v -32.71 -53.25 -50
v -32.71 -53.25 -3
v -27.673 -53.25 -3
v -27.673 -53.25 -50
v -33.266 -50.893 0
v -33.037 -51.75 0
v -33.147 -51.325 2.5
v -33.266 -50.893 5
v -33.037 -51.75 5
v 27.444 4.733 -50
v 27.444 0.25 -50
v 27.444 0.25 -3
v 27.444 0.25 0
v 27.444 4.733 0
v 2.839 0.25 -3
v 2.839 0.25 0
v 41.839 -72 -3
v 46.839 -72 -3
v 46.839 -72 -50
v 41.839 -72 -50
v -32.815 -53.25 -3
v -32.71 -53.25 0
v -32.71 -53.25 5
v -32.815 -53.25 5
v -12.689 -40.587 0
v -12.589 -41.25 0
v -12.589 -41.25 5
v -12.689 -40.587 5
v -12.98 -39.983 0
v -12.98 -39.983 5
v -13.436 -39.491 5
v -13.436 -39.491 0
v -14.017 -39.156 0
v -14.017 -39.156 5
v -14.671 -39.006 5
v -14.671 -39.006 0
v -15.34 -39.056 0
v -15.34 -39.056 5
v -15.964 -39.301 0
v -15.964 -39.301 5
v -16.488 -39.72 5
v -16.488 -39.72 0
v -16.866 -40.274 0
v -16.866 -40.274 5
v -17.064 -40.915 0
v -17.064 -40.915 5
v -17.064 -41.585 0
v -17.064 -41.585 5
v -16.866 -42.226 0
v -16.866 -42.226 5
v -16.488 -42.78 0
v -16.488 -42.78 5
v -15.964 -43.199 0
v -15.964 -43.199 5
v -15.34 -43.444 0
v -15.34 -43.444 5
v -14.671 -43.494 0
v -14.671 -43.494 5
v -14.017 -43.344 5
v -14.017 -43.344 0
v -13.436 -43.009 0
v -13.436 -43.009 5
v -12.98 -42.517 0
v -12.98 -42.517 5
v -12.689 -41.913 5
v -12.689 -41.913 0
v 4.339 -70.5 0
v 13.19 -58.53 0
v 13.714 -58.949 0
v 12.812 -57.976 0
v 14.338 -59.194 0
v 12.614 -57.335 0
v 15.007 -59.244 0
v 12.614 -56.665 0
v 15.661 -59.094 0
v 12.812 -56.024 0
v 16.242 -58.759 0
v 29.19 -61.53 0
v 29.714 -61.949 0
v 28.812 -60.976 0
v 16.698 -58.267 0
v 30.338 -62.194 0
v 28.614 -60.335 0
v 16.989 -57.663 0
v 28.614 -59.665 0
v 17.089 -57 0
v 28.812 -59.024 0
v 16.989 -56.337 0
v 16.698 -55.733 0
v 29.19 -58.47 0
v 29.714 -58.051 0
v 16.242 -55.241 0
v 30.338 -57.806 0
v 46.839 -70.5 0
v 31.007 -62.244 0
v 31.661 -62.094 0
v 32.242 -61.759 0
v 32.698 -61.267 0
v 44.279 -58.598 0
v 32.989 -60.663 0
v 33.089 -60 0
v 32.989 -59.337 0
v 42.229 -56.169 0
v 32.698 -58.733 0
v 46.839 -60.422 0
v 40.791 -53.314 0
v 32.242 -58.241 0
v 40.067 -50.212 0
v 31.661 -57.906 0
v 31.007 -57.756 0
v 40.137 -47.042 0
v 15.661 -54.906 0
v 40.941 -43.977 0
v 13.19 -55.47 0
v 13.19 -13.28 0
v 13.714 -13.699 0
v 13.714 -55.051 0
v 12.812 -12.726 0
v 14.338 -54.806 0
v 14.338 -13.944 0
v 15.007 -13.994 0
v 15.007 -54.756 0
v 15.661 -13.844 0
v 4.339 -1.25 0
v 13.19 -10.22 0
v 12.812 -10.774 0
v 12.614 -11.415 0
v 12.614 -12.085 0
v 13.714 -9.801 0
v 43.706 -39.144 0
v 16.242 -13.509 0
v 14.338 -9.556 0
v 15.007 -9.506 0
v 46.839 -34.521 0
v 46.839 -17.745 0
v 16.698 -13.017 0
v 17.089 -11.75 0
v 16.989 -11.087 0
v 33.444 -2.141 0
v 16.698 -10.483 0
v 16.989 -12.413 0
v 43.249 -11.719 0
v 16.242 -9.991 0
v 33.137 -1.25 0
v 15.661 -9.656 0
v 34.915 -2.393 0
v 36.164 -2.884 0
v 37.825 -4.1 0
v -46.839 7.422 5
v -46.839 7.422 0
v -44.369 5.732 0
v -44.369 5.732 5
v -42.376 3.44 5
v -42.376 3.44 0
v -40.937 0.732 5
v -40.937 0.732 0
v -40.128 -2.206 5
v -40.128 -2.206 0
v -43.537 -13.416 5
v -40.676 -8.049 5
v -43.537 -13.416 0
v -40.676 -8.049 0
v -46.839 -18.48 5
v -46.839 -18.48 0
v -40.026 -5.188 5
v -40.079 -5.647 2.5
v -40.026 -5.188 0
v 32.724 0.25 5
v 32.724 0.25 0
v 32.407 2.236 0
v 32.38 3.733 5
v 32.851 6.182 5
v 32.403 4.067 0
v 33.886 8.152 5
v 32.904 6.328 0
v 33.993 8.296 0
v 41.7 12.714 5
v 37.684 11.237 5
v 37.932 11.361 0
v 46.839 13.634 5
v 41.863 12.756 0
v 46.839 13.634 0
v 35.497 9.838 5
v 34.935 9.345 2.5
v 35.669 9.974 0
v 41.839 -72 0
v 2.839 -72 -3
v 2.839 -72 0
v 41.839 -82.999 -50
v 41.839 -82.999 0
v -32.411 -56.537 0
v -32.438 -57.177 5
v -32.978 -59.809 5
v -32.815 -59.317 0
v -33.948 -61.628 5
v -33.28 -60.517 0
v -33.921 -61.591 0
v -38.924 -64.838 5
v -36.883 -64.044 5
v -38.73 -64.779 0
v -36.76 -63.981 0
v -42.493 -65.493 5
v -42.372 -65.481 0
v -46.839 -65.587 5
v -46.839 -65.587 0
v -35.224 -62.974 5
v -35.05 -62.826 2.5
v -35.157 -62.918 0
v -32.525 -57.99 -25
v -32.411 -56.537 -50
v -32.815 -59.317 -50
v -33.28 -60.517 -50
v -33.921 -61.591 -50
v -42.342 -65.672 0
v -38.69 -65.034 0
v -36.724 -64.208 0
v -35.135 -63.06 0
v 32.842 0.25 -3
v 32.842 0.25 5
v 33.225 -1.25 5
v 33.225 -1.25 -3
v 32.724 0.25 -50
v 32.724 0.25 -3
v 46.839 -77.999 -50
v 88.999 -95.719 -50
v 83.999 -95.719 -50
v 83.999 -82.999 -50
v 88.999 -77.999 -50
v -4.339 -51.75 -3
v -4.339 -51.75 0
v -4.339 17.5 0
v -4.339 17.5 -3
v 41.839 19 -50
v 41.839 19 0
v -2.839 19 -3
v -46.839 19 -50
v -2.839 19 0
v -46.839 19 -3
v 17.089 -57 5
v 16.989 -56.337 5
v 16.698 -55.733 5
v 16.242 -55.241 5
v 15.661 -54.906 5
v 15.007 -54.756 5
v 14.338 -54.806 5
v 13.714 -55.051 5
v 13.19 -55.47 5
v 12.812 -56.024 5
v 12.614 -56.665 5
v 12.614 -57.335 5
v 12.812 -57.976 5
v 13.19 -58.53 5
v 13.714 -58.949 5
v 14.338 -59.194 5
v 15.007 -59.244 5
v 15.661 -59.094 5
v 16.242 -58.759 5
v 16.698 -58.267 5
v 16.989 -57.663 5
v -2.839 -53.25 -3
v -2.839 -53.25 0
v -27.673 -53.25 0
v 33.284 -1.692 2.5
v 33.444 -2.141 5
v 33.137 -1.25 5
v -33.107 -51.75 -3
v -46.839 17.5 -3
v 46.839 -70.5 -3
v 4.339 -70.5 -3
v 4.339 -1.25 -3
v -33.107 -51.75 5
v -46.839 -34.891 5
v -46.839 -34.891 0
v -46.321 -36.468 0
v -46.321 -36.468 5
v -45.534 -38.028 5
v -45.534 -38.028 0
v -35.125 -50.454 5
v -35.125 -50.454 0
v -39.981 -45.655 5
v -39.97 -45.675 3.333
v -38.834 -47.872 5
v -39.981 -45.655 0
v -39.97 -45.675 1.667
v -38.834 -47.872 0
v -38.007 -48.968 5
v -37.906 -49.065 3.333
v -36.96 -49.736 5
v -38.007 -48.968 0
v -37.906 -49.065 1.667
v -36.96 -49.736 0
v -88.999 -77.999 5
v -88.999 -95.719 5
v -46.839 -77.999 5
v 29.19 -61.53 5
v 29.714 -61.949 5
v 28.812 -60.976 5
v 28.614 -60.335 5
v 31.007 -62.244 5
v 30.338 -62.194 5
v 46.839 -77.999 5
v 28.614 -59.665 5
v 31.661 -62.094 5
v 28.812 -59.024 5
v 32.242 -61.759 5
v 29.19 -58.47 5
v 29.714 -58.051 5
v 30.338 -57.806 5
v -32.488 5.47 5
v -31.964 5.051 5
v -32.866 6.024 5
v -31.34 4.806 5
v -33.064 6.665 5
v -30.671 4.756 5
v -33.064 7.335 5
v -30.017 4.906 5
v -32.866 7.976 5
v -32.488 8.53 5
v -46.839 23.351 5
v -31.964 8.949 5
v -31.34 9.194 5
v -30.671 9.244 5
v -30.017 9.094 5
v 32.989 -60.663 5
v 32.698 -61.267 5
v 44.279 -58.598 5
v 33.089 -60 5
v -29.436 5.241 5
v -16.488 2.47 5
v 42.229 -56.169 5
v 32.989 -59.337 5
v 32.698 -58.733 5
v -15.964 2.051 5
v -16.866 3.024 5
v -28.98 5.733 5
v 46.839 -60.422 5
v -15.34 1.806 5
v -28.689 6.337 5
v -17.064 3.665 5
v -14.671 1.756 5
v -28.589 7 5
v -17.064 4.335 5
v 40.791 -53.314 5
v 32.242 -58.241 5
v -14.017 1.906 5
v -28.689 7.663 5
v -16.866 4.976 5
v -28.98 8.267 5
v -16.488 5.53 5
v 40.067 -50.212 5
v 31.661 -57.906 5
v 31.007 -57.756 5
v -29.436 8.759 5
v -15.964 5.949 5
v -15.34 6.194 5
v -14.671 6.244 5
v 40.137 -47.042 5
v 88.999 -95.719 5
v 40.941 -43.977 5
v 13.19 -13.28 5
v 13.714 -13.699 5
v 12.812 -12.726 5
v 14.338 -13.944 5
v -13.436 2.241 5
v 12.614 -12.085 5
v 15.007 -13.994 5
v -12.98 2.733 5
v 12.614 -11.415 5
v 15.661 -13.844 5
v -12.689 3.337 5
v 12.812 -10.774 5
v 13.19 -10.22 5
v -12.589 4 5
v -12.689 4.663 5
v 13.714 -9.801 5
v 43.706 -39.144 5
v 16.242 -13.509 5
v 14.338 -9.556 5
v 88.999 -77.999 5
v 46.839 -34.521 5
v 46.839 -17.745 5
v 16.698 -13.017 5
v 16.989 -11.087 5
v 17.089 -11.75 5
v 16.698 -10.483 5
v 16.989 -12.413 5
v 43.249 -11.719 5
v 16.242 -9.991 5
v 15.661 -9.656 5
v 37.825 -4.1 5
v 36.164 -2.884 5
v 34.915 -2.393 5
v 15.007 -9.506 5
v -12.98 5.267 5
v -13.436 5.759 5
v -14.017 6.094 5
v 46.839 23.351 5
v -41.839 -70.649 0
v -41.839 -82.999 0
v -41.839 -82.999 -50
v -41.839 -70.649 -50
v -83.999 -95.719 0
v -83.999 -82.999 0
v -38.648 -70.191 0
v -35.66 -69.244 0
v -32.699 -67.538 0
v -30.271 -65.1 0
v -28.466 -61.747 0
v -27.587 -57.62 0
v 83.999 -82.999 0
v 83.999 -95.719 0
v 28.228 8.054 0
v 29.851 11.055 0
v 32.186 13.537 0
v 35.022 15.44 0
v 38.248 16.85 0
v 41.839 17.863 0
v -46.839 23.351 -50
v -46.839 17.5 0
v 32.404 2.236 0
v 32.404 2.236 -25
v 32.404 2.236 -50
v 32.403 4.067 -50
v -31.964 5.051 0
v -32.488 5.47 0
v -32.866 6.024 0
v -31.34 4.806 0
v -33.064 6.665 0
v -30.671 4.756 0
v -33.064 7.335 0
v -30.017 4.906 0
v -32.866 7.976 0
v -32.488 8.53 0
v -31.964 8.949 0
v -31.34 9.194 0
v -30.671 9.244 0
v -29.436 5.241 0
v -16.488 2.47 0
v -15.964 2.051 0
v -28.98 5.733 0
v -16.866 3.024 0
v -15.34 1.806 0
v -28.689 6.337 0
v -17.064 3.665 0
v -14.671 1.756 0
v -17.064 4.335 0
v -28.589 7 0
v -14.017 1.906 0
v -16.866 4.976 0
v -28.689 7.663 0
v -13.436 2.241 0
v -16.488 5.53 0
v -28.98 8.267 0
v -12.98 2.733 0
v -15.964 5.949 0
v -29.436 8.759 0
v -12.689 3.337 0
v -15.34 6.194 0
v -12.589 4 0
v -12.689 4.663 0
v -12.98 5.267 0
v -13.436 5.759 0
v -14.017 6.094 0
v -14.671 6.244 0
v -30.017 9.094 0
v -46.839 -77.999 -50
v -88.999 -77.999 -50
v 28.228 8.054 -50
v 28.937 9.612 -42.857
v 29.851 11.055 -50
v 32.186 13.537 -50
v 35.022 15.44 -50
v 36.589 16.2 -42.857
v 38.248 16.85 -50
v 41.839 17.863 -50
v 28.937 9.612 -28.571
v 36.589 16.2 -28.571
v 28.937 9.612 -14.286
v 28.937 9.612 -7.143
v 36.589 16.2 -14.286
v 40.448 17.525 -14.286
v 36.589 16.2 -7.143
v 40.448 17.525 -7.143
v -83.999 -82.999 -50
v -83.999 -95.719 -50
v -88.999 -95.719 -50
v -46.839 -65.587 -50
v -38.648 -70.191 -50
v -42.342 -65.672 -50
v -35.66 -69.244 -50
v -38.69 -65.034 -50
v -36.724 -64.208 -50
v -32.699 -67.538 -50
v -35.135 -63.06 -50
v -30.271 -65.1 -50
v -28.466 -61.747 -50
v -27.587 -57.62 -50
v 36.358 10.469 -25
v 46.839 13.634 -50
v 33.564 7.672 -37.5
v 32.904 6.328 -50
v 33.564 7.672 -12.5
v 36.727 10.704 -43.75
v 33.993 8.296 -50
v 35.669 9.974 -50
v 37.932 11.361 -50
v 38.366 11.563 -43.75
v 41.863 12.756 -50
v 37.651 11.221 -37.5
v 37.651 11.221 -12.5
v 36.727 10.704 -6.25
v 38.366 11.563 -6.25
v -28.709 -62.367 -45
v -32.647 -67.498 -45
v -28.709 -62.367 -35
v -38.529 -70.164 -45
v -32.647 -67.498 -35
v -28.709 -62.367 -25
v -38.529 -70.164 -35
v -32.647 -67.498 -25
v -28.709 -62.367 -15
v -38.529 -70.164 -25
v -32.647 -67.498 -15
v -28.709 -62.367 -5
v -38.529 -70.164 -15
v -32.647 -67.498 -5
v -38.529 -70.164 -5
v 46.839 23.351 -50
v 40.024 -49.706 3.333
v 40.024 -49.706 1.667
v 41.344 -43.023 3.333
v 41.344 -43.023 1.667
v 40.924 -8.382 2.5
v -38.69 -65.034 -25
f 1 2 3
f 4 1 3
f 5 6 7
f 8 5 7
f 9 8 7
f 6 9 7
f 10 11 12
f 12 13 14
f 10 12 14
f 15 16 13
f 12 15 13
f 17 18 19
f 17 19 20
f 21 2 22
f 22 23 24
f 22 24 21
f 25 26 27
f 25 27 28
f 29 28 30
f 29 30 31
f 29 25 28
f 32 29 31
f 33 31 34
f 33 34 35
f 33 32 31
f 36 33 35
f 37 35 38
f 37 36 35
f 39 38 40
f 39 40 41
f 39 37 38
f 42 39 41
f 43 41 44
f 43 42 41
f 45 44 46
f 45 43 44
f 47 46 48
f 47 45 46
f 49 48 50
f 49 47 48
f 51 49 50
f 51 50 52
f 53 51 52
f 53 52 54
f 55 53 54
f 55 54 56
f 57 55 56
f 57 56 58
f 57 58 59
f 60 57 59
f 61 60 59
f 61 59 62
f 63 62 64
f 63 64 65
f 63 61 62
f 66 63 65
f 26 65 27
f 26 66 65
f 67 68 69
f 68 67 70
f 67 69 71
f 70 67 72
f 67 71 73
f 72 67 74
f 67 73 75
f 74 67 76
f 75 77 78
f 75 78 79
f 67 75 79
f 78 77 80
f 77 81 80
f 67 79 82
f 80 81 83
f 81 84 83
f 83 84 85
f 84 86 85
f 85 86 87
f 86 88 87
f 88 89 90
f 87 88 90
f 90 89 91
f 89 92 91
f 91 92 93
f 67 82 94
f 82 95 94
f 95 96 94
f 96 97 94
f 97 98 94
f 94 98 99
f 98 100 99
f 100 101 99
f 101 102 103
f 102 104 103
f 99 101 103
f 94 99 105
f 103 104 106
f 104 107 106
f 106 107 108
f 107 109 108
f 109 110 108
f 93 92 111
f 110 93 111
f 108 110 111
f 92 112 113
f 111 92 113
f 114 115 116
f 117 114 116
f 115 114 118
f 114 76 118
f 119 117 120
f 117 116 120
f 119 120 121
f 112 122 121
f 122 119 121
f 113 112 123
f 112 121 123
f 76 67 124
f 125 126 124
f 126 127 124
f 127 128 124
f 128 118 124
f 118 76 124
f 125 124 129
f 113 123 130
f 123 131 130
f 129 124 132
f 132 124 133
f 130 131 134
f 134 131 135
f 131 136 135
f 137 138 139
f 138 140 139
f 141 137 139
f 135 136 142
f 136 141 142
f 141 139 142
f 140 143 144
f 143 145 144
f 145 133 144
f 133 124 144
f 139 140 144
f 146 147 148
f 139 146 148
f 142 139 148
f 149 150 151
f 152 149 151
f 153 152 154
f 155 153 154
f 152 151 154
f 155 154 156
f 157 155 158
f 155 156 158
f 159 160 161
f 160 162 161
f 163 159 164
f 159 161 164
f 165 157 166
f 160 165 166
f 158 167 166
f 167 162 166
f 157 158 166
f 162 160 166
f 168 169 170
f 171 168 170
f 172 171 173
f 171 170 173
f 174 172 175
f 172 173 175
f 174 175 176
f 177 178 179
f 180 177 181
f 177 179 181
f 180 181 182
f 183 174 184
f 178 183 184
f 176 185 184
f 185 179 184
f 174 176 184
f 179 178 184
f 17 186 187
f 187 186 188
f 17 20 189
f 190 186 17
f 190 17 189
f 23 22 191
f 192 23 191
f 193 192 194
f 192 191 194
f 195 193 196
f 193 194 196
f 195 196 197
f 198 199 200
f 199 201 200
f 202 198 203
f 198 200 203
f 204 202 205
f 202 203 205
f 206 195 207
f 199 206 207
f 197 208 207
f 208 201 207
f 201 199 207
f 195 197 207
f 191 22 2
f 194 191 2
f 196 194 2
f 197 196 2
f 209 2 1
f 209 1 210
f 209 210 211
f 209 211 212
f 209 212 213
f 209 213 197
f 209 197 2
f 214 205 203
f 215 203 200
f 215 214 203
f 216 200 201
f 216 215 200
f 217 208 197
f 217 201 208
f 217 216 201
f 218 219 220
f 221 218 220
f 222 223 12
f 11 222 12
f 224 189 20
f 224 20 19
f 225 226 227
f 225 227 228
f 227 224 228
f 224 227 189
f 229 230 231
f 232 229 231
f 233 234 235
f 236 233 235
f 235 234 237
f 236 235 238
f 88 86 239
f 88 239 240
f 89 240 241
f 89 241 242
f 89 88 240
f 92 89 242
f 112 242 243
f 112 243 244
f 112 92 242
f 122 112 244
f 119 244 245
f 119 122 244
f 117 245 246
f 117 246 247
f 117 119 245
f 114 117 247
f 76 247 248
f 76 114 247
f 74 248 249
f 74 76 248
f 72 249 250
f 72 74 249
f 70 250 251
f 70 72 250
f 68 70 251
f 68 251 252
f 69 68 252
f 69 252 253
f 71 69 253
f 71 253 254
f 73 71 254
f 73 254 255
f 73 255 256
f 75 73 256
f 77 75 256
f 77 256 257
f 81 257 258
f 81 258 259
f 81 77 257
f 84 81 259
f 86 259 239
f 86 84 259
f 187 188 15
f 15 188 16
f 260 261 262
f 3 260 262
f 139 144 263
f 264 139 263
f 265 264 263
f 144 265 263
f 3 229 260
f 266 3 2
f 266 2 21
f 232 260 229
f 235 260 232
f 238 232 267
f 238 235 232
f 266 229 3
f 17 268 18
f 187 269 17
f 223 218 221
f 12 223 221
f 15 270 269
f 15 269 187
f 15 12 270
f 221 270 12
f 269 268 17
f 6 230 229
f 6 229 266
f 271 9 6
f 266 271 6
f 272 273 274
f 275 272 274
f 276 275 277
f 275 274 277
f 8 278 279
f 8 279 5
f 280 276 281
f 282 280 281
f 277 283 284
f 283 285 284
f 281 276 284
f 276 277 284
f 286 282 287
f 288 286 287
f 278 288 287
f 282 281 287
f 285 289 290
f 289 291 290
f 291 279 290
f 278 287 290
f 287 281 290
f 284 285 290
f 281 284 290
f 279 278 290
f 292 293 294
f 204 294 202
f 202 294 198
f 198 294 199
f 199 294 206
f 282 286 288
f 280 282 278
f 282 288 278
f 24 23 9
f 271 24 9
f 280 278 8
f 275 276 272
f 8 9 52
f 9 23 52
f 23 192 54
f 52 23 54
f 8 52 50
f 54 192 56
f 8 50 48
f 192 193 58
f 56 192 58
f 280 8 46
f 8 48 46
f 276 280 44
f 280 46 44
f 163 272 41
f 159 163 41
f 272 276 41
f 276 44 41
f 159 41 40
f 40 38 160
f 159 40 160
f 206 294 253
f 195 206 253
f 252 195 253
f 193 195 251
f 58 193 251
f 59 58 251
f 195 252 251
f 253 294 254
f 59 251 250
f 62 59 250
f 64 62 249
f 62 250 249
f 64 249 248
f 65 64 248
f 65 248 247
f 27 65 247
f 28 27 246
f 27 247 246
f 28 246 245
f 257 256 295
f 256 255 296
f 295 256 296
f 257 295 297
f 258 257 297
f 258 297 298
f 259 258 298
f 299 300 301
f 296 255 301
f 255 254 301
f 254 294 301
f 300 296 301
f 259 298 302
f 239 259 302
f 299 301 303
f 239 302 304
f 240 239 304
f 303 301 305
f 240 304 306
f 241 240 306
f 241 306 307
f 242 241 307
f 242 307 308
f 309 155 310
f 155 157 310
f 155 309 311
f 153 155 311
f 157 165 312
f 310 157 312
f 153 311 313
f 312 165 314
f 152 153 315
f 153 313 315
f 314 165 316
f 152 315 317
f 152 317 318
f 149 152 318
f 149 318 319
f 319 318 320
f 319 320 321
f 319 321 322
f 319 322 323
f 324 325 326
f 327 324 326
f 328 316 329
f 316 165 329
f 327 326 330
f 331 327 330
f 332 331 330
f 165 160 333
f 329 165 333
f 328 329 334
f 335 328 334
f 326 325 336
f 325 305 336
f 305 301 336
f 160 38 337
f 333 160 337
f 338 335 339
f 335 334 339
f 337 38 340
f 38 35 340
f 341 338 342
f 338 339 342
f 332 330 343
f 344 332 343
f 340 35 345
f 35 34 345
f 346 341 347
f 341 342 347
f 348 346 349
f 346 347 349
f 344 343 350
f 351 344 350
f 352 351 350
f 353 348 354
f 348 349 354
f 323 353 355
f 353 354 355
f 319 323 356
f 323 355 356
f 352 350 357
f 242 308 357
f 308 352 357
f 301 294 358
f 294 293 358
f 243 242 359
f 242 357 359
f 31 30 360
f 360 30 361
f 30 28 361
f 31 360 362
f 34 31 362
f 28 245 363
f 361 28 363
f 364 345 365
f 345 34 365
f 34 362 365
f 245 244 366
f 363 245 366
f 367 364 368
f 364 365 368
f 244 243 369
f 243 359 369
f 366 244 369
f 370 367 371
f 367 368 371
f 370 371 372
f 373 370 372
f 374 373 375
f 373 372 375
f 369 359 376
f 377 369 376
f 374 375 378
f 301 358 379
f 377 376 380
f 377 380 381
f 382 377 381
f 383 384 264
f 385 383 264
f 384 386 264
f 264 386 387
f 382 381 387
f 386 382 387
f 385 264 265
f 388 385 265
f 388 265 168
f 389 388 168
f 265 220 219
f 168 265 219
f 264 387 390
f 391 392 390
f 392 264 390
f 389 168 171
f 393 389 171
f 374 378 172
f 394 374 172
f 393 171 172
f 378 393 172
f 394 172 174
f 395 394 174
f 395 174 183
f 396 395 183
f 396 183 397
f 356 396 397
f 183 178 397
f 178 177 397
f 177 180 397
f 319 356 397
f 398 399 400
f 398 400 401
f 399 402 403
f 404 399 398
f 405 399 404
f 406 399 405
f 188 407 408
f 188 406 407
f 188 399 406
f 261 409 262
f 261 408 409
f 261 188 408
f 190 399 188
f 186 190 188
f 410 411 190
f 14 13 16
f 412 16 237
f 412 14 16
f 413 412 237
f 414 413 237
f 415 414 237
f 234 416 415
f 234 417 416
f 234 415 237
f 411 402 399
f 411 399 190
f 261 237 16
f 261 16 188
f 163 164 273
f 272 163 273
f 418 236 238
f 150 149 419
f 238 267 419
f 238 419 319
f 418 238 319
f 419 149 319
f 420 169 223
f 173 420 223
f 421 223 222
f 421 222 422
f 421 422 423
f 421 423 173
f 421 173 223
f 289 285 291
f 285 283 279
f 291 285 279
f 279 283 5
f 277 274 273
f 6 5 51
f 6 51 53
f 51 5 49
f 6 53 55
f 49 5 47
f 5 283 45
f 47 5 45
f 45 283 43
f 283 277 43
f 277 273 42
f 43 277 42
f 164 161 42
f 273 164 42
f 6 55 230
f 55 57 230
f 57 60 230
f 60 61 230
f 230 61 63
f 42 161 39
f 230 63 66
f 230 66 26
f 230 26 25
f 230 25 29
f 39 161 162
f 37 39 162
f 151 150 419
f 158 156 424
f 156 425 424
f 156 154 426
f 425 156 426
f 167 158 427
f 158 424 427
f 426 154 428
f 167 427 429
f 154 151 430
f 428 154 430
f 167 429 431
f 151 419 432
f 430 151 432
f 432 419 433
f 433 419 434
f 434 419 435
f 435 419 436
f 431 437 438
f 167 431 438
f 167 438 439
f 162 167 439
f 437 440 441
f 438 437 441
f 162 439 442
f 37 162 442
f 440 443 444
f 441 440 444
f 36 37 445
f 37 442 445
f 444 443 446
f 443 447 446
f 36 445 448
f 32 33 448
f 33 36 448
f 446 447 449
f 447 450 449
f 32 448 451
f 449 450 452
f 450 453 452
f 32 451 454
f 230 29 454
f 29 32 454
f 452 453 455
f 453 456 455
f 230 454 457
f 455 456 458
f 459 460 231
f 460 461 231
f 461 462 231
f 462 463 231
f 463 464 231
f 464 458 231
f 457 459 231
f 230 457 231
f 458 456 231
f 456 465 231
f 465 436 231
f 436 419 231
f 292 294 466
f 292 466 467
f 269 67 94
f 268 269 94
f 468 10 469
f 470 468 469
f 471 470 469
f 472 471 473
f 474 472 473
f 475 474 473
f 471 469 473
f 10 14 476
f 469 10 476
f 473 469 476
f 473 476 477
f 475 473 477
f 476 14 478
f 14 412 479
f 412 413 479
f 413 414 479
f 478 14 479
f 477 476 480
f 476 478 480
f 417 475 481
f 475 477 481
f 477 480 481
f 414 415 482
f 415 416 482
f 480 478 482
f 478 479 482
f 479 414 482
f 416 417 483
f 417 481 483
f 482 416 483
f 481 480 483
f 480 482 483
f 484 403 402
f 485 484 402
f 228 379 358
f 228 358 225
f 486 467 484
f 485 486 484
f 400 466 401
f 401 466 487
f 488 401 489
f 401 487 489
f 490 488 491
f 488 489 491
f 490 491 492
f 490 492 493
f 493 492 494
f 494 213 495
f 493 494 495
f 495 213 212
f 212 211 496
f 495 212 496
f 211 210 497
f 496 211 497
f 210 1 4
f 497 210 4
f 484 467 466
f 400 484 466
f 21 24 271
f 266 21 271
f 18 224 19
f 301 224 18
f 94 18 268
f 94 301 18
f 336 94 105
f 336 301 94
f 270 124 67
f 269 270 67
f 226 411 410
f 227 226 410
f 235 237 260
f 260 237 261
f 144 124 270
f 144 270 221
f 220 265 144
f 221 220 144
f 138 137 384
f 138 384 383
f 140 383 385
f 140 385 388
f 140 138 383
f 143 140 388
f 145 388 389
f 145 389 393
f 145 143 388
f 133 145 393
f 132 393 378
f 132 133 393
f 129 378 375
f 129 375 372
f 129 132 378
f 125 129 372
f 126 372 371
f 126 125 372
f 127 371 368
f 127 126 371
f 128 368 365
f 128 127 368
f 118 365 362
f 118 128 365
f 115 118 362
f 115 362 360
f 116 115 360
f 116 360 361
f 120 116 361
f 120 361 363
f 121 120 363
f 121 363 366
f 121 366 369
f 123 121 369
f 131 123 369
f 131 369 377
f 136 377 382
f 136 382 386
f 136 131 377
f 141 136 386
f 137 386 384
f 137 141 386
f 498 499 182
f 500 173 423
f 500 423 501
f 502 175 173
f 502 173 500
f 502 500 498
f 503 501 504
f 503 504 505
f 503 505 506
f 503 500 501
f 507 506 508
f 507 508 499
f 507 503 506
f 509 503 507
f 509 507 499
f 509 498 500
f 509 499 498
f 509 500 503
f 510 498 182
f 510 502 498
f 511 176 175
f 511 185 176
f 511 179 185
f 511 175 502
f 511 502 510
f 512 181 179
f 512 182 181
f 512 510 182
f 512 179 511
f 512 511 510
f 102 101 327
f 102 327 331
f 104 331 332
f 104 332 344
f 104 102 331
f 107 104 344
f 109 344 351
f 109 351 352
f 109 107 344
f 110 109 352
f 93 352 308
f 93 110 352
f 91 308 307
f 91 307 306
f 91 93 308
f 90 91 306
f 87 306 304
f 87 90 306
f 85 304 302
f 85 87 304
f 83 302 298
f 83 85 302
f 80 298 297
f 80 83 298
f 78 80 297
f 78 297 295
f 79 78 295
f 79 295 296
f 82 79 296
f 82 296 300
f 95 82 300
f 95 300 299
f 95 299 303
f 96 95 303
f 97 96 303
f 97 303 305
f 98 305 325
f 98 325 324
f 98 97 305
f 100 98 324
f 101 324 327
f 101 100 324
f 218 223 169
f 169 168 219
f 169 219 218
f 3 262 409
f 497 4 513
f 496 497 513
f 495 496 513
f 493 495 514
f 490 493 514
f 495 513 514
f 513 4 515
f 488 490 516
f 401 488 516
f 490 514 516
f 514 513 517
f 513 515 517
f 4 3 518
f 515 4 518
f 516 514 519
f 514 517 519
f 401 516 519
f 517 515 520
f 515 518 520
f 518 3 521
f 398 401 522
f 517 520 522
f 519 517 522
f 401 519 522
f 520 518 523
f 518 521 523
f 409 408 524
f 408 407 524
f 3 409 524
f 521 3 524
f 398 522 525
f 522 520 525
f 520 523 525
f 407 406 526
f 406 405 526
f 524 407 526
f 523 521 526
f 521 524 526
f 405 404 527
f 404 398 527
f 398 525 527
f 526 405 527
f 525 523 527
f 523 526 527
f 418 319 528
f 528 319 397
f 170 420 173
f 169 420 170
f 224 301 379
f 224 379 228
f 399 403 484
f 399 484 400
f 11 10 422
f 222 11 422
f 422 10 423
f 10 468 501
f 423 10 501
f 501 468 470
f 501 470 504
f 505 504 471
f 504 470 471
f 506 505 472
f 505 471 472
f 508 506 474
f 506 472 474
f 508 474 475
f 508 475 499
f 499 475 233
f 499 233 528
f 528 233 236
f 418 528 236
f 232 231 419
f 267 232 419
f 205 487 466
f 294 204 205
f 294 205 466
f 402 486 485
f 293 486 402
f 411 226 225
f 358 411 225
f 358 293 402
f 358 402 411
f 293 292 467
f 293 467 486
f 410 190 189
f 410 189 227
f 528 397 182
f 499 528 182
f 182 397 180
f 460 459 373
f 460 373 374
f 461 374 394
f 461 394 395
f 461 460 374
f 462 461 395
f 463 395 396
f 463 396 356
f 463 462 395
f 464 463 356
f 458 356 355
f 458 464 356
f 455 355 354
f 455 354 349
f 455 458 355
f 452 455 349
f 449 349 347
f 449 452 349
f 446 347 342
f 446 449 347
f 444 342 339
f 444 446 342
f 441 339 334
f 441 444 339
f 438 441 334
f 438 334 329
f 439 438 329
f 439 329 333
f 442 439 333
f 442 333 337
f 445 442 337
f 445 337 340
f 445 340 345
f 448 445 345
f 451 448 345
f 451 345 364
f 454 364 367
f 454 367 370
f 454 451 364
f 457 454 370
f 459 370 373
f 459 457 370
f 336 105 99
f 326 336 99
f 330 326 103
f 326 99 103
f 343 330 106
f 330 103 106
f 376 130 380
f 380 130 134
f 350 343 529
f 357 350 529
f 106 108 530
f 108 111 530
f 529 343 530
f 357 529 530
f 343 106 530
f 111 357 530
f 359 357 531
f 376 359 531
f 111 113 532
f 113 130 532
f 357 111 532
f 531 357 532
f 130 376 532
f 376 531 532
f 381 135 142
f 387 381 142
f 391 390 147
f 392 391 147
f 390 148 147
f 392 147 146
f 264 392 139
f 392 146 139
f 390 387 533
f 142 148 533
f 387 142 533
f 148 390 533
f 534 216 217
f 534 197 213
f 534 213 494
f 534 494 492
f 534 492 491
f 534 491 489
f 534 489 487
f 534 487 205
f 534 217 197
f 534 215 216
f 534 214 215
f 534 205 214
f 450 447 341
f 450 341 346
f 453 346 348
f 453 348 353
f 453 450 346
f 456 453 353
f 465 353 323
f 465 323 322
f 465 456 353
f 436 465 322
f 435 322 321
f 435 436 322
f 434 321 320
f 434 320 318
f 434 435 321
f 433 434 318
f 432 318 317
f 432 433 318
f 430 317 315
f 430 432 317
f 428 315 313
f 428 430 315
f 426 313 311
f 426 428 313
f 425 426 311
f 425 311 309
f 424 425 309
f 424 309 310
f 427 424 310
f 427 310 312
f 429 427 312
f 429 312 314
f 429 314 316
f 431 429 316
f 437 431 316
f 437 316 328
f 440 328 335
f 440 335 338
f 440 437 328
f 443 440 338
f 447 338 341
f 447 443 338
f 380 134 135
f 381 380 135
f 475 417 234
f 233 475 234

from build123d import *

# Parameters (mm, degrees)
SKETCH1_R            = 2.25
BOSS_EXTRUDE1_DEPTH  = 5
SKETCH7_R            = 2
CUT_EXTRUDE1_DEPTH   = 10
SKETCH10_W           = 93.677769422
SKETCH10_H           = 89.648680449
CUT_EXTRUDE4_DEPTH   = 10
LPATTERN1_COUNT      = 2
LPATTERN1_PITCH      = 144.65
SKETCH13_W           = 93.677769422
SKETCH13_H           = 54.298680449
BOSS_EXTRUDE2_DEPTH  = 5
SKETCH18_W           = 93.677769422
SKETCH18_H           = 5
BOSS_EXTRUDE5_DEPTH  = 5
BOSS_EXTRUDE7_DEPTH  = 8
SKETCH19_W           = 93.677769422
SKETCH19_H           = 5
BOSS_EXTRUDE8_DEPTH  = 47
SKETCH21_W           = 93.677769422
SKETCH21_H           = 5
BOSS_EXTRUDE9_DEPTH  = 3
BOSS_EXTRUDE10_DEPTH = 50
CUT_EXTRUDE5_REACH   = 289.015
FILLET1_R            = 10
SKETCH25_W           = 93.677769422
SKETCH25_H           = 185.51612098
CUT_EXTRUDE7_DEPTH   = 55
SKETCH26_W           = 5
SKETCH26_H           = 17.72
BOSS_EXTRUDE11_DEPTH = 42.16
BOSS_EXTRUDE12_DEPTH = 50


# Read off the part's stored shape, not the designer's step: Boss-Extrude10
with BuildPart() as part:
    # Sketch1 → Boss-Extrude1 (new body)
    with BuildSketch(Plane.XY):
        with BuildLine():
            Line((0, 110), (-46.838884711, 110))
            Line((-46.838884711, 110), (-46.838884711, 100.421650596))
            add(Edge.make_bspline(
                [(-46.838884711, 100.421650596), (-42.226362844, 98.141206473), (-36.711667831, 86.910333368), (-44.527260711, 78.55539065), (-46.838884711, 74.520163403)],
                knots=[0, 0, 0, 0, 0.5133871, 0.998542736, 0.998542736, 0.998542736, 0.998542736], degree=3))
            Line((-46.838884711, 74.520163403), (-46.838884711, 58.109446399))
            add(Edge.make_bspline(
                [(-46.838884711, 58.109446399), (-45.758632516, 53.655222634), (-40.885867203, 50.40646242), (-38.238529072, 43.136574556), (-34.782140744, 42.431604419), (-33.266055192, 42.106985538)],
                knots=[0, 0, 0, 0, 0.587735064, 0.769686025, 1, 1, 1, 1], degree=3))
            add(Edge.make_bspline(
                [(-33.266055192, 42.106985538), (-28.892413212, 26.709459558), (-46.838884711, 27.412777151)],
                knots=[0, 0, 0, 1, 1, 1], degree=2))
            Line((-46.838884711, 27.412777151), (-46.838884711, 7.421650596))
            add(Edge.make_bspline(
                [(-46.838884711, 7.421650596), (-42.226362844, 5.141206473), (-36.711667831, -6.089666632), (-44.527260711, -14.44460935), (-46.838884711, -18.479836597)],
                knots=[0, 0, 0, 0, 0.5133871, 0.998542736, 0.998542736, 0.998542736, 0.998542736], degree=3))
            Line((-46.838884711, -18.479836597), (-46.838884711, -34.890553601))
            add(Edge.make_bspline(
                [(-46.838884711, -34.890553601), (-45.758632516, -39.344777366), (-40.885867203, -42.59353758), (-38.238529072, -49.863425444), (-34.782140744, -50.568395581), (-33.266055192, -50.893014462)],
                knots=[0, 0, 0, 0, 0.587735064, 0.769686025, 1, 1, 1, 1], degree=3))
            add(Edge.make_bspline(
                [(-33.266055192, -50.893014462), (-28.892413212, -66.290540442), (-46.838884711, -65.587222849)],
                knots=[0, 0, 0, 1, 1, 1], degree=2))
            Line((-46.838884711, -65.587222849), (-46.838884711, -70))
            Line((-46.838884711, -70), (0, -70))
            Line((0, -70), (46.838884711, -70))
            Line((46.838884711, -70), (46.838884711, -60.421650596))
            add(Edge.make_bspline(
                [(46.838884711, -60.421650596), (42.982832164, -58.395834606), (38.906182163, -51.871311027), (41.138601483, -41.632996987), (45.188996373, -37.461060264), (46.838884711, -34.520947075)],
                knots=[0, 0, 0, 0, 0.434931401, 0.661677592, 0.998582109, 0.998582109, 0.998582109, 0.998582109], degree=3))
            Line((46.838884711, -34.520947075), (46.838884711, -17.744628899))
            add(Edge.make_bspline(
                [(46.838884711, -17.744628899), (45.396033977, -14.277729688), (40.758990778, -9.004665614), (37.573327769, -2.447994476), (33.443642317, -2.141285146)],
                knots=[0, 0, 0, 0, 0.525454982, 1, 1, 1, 1], degree=3))
            add(Edge.make_bspline(
                [(33.443642317, -2.141285146), (28.416523532, 11.559488336), (46.838884711, 13.634393344)],
                knots=[0, 0, 0, 1, 1, 1], degree=2))
            Line((46.838884711, 13.634393344), (46.838884711, 32.578349404))
            add(Edge.make_bspline(
                [(46.838884711, 32.578349404), (42.982832164, 34.604165394), (38.906182163, 41.128688973), (41.138601483, 51.367003013), (45.188996373, 55.538939736), (46.838884711, 58.479052925)],
                knots=[0, 0, 0, 0, 0.434931401, 0.661677592, 0.998582109, 0.998582109, 0.998582109, 0.998582109], degree=3))
            Line((46.838884711, 58.479052925), (46.838884711, 75.255371101))
            add(Edge.make_bspline(
                [(46.838884711, 75.255371101), (45.396033977, 78.722270312), (40.758990778, 83.995334386), (37.573327769, 90.552005524), (33.443642317, 90.858714854)],
                knots=[0, 0, 0, 0, 0.525454982, 1, 1, 1, 1], degree=3))
            Line((33.443642317, 90.858714854), (0, 110))
        make_face()
        with Locations((-14.838884711, -41.25)):
            Circle(SKETCH1_R, mode=Mode.SUBTRACT)
        with Locations((-30.838884711, 7)):
            Circle(SKETCH1_R, mode=Mode.SUBTRACT)
        with Locations((-14.838884711, 4)):
            Circle(SKETCH1_R, mode=Mode.SUBTRACT)
        with Locations((14.838884711, -57)):
            Circle(SKETCH1_R, mode=Mode.SUBTRACT)
        with Locations((30.838884711, -60)):
            Circle(SKETCH1_R, mode=Mode.SUBTRACT)
        with Locations((14.838884711, -11.75)):
            Circle(SKETCH1_R, mode=Mode.SUBTRACT)
        with Locations((-14.838884711, 51.75)):
            Circle(SKETCH1_R, mode=Mode.SUBTRACT)
        with Locations((-30.838884711, 100)):
            Circle(SKETCH1_R, mode=Mode.SUBTRACT)
        with Locations((-14.838884711, 97)):
            Circle(SKETCH1_R, mode=Mode.SUBTRACT)
        with Locations((14.838884711, 36)):
            Circle(SKETCH1_R, mode=Mode.SUBTRACT)
        with Locations((30.838884711, 33)):
            Circle(SKETCH1_R, mode=Mode.SUBTRACT)
        with Locations((14.838884711, 81.25)):
            Circle(SKETCH1_R, mode=Mode.SUBTRACT)
    extrude(amount=BOSS_EXTRUDE1_DEPTH)

    # Sketch7 → Cut-Extrude1 (cut)
    with BuildSketch(Plane.XY.offset(5)):
        with Locations((-41.838884711, 23.5)):
            Circle(SKETCH7_R)
        with Locations((-41.838884711, 67)):
            Circle(SKETCH7_R)
        with Locations((40.861115289, 67)):
            Circle(SKETCH7_R)
        with Locations((40.861115289, 23.5)):
            Circle(SKETCH7_R)
    extrude(amount=-CUT_EXTRUDE1_DEPTH, mode=Mode.SUBTRACT)

    # Sketch10 → Cut-Extrude4 (cut)
    with BuildSketch(Plane.XY.offset(5)):
        with Locations((0, 65.175659775)):
            Rectangle(SKETCH10_W, SKETCH10_H)
    extrude(amount=-CUT_EXTRUDE4_DEPTH, mode=Mode.SUBTRACT)


with BuildPart() as lpattern1_1:
    # LPattern1: pattern copy
    add(part.part.moved(Location(Vector(0, -1, 0) * (1 * LPATTERN1_PITCH))))


with BuildPart() as part_1:
    add(part.part)

    add(lpattern1_1.part)  # Boss-Extrude2 merges LPattern1_1
    # Sketch13 → Boss-Extrude2 (add)
    with BuildSketch(Plane.XY.offset(5)):
        with Locations((0, -97.149340225)):
            Rectangle(SKETCH13_W, SKETCH13_H)
    extrude(amount=-BOSS_EXTRUDE2_DEPTH)

    # Sketch18 → Boss-Extrude5 (add)
    with BuildSketch(Plane.XY.offset(5)):
        with Locations((0, -217.15)):
            Rectangle(SKETCH18_W, SKETCH18_H)
    extrude(amount=-BOSS_EXTRUDE5_DEPTH)

    # Sketch17 → Boss-Extrude7 (add)
    with BuildSketch(Plane.XY.offset(5)):
        Polygon((33.137486483, -1.25), (4.338884711, -1.25), (4.338884711, -70.5), (46.838884711, -70.5), (46.838884711, -72), (2.838884711, -72), (2.838884711, 0.25), (32.841973097, 0.25), (33.225056852, -1.25), align=None)
        Polygon((-33.036788629, -51.75), (-4.338884711, -51.75), (-4.338884711, 17.5), (-46.838884711, 17.5), (-46.838884711, 19), (-2.838884711, 19), (-2.838884711, -53.25), (-32.814550412, -53.25), (-33.107034097, -51.75), align=None)
        Polygon((-33.036788629, -196.4), (-4.338884711, -196.4), (-4.338884711, -127.15), (-46.838884711, -127.15), (-46.838884711, -125.65), (-2.838884711, -125.65), (-2.838884711, -197.9), (-32.814550412, -197.9), (-33.107034097, -196.4), align=None)
        Polygon((33.137486483, -145.9), (4.338884711, -145.9), (4.338884711, -215.15), (46.838884711, -215.15), (46.838884711, -216.65), (2.838884711, -216.65), (2.838884711, -144.4), (32.841973097, -144.4), (33.225056852, -145.9), align=None)
    extrude(amount=-BOSS_EXTRUDE7_DEPTH)

    # Sketch19 → Boss-Extrude8 (add)
    with BuildSketch(Plane.XZ.offset(219.65)):
        with Locations((0, 2.5)):
            Rectangle(SKETCH19_W, SKETCH19_H)
    extrude(amount=BOSS_EXTRUDE8_DEPTH)

    # Sketch21 → Boss-Extrude9 (add)
    with BuildSketch(Plane(origin=(0, 20.351319551, 0), x_dir=(1, 0, 0), z_dir=(0, 1, 0))):
        with Locations((0, -2.5)):
            Rectangle(SKETCH21_W, SKETCH21_H)
    extrude(amount=BOSS_EXTRUDE9_DEPTH)

    # Boss-Extrude10 outline → Boss-Extrude10 (add)
    with BuildSketch(Plane(origin=(0, 0, 0), x_dir=(-1, 0, 0), z_dir=(0, 0, -1))):
        with BuildLine():
            add(Edge.make_bspline(
                [(-32.724261898, 0.25), (-32.245095706, 2.312784936), (-32.402626668, 4.067426464)],
                knots=[0, 0, 0, 0.181136716, 0.181136716, 0.181136716], degree=2))
            Line((-32.724261898, 0.25), (-27.443994886, 0.25))
            Line((-27.443994886, 0.25), (-27.443994886, 4.733336658))
            add(Edge.make_bspline(
                [(-27.443994886, 4.733336658), (-27.622087216, 6.424627618), (-28.62420051, 9.790004967), (-31.441552833, 13.106082614), (-34.237499241, 15.062797915), (-36.55480341, 16.241237453), (-38.657870419, 17.017473528), (-40.436527292, 17.53229138), (-41.373204052, 17.759709119), (-41.838884711, 17.863154596)],
                knots=[0.188508433, 0.188508433, 0.188508433, 0.188508433, 0.359878628, 0.531248824, 0.616933921, 0.702619019, 0.788304117, 0.831146666, 0.873989214, 0.873989214, 0.873989214, 0.873989214], degree=3))
            Line((-41.838884711, 17.863154596), (-41.838884711, 19))
            Line((-41.838884711, 19), (46.838884711, 19))
            Line((46.838884711, 19), (46.838884711, 23.351319551))
            Line((46.838884711, 23.351319551), (-46.838884711, 23.351319551))
            Line((-46.838884711, 23.351319551), (-46.838884711, 13.634393344))
            add(Edge.make_bspline(
                [(-32.402626668, 4.067426464), (-33.094751911, 12.086395793), (-46.838884711, 13.634393344)],
                knots=[0.25394293, 0.25394293, 0.25394293, 1, 1, 1], degree=2))
        make_face()
        with BuildLine():
            add(Edge.make_bspline(
                [(32.709776931, -53.25), (31.734780647, -58.560461643), (33.920713563, -61.590754477)],
                knots=[0.079873384, 0.079873384, 0.079873384, 0.456195017, 0.456195017, 0.456195017], degree=2))
            Line((32.709776931, -53.25), (27.672993194, -53.25))
            add(Edge.make_bspline(
                [(27.672993194, -53.25), (27.634044039, -53.603919753), (27.549470722, -54.53429273), (27.478130031, -56.55603599), (27.696443256, -59.281114668), (28.584970164, -62.41153087), (30.219766888, -65.27653857), (32.567186832, -67.613698936), (35.393773129, -69.256198214), (37.979457465, -70.085815151), (40.144646291, -70.485795849), (41.276481585, -70.607362141), (41.838884711, -70.649060215)],
                knots=[0.020227728, 0.020227728, 0.020227728, 0.020227728, 0.052559154, 0.105118307, 0.210236615, 0.315354922, 0.42047323, 0.525591537, 0.630709845, 0.735828152, 0.788387306, 0.840946459, 0.840946459, 0.840946459, 0.840946459], degree=3))
            Line((41.838884711, -70.649060215), (46.838884711, -70.649060215))
            Line((46.838884711, -70.649060215), (46.838884711, -65.587222848))
            add(Edge.make_bspline(
                [(33.920713563, -61.590754477), (36.999202525, -66.479878046), (46.838884711, -65.587222848)],
                knots=[0.383965009, 0.383965009, 0.383965009, 1, 1, 1], degree=2))
        make_face()
        with BuildLine():
            add(Edge.make_bspline(
                [(-32.724261899, -144.4), (-32.245095735, -142.337215187), (-32.40262665, -140.582573745)],
                knots=[0, 0, 0, 0.181136705, 0.181136705, 0.181136705], degree=2))
            Line((-32.724261899, -144.4), (-27.624350546, -144.4))
            add(Edge.make_bspline(
                [(-27.624350546, -144.4), (-27.502918691, -143.696257513), (-27.293028635, -141.891316279), (-27.435749972, -139.015823853), (-28.37747966, -135.845139515), (-30.113029915, -133.024976386), (-32.462833621, -130.741878365), (-35.232498366, -128.995170141), (-37.82646734, -127.905854752), (-40.056119375, -127.214276507), (-41.247409264, -126.918228045), (-41.838884711, -126.786845404)],
                knots=[0.038284513, 0.038284513, 0.038284513, 0.038284513, 0.109248652, 0.218497304, 0.327745955, 0.436994607, 0.546243259, 0.655491911, 0.764740563, 0.819364888, 0.873989214, 0.873989214, 0.873989214, 0.873989214], degree=3))
            Line((-41.838884711, -126.786845404), (-46.838884711, -126.786845404))
            Line((-46.838884711, -126.786845404), (-46.838884711, -131.015606656))
            add(Edge.make_bspline(
                [(-32.40262665, -140.582573745), (-33.094751732, -132.563604227), (-46.838884711, -131.015606656)],
                knots=[0.25394292, 0.25394292, 0.25394292, 1, 1, 1], degree=2))
        make_face()
        with BuildLine():
            add(Edge.make_bspline(
                [(32.709776931, -197.9), (31.734780645, -203.210461655), (33.920713573, -206.240754491)],
                knots=[0.079873384, 0.079873384, 0.079873384, 0.456195018, 0.456195018, 0.456195018], degree=2))
            Line((32.709776931, -197.9), (27.672993196, -197.9))
            add(Edge.make_bspline(
                [(27.672993196, -197.9), (27.63404404, -198.253919753), (27.549470724, -199.184292729), (27.478130032, -201.206035989), (27.696443257, -203.931114667), (28.584970165, -207.061530869), (30.219766889, -209.926538569), (32.567186833, -212.263698936), (35.393773129, -213.906198214), (37.979457465, -214.73581515), (40.144646291, -215.135795849), (41.276481585, -215.25736214), (41.838884711, -215.299060215)],
                knots=[0.020227728, 0.020227728, 0.020227728, 0.020227728, 0.052559154, 0.105118307, 0.210236615, 0.315354922, 0.42047323, 0.525591537, 0.630709845, 0.735828152, 0.788387306, 0.84094646, 0.84094646, 0.84094646, 0.84094646], degree=3))
            Line((41.838884711, -215.299060215), (41.838884711, -261.65))
            Line((41.838884711, -261.65), (-41.838884711, -261.65))
            Line((-41.838884711, -261.65), (-41.838884711, -216.65))
            Line((-41.838884711, -216.65), (-46.838884711, -216.65))
            Line((-46.838884711, -216.65), (-46.838884711, -266.65))
            Line((-46.838884711, -266.65), (46.838884711, -266.65))
            Line((46.838884711, -266.65), (46.838884711, -210.237222849))
            add(Edge.make_bspline(
                [(33.920713573, -206.240754491), (36.999202539, -211.129878044), (46.838884711, -210.237222849)],
                knots=[0.38396501, 0.38396501, 0.38396501, 1, 1, 1], degree=2))
        make_face()
    extrude(amount=BOSS_EXTRUDE10_DEPTH)

    # Cut-Extrude5: up to this face of the body (flat: up to its plane)
    cut_extrude5_end = Plane(part_1.part.faces().sort_by_distance((46.838884711, -170.782787987, 2.5))[0])
    # Sketch24 → Cut-Extrude5 (cut, up to the picked face)
    with BuildSketch(Plane.ZY.offset(46.838884711), mode=Mode.PRIVATE) as cut_extrude5_sk1:
        Polygon((-50, -266.65), (5, -256.952016061), (5, -266.65), align=None)
    cut_extrude5_tool1 = split(extrude(cut_extrude5_sk1.sketch, amount=-CUT_EXTRUDE5_REACH, mode=Mode.PRIVATE), bisect_by=cut_extrude5_end, keep=Keep.BOTH, mode=Mode.PRIVATE)
    add(cut_extrude5_tool1.solids().sort_by(Axis((-46.838885, -263.417339, -13.333333), (1, 0, 0)))[0], mode=Mode.SUBTRACT)

    # Fillet1
    # the kernel refuses this fillet: 10 mm, written as the material it takes off along each edge
    with BuildSketch(Plane(origin=(46.838884711, -270.991204442, -74.620193825), x_dir=(0, 0.9848077530122092, -0.17364817766692375), z_dir=(0, 0.17364817766692378, 0.9848077530122094)), Plane(origin=(-46.838884711, -270.991204442, -74.620193825), x_dir=(1, 0, 0), z_dir=(0, 0.17364817766692378, 0.9848077530122094))) as fillet1_piece_1:
        with BuildLine():
            CenterArc((FILLET1_R, FILLET1_R), FILLET1_R, 180, 90)
            Line((0, FILLET1_R), (0, 0))
            Line((0, 0), (FILLET1_R, 0))
        make_face()
    extrude(amount=105.848463654, mode=Mode.SUBTRACT)

    # Sketch25 → Cut-Extrude7 (cut)
    with BuildSketch(Plane.XY.offset(5)):
        with Locations((0, -188.476689117)):
            Rectangle(SKETCH25_W, SKETCH25_H)
    extrude(amount=-CUT_EXTRUDE7_DEPTH, mode=Mode.SUBTRACT)

    # Sketch26 → Boss-Extrude11 (add)
    with BuildSketch(Plane(origin=(46.838884711, 0, 0), x_dir=(0, 0, -1), z_dir=(1, 0, 0))):
        with Locations((-2.5, -86.858628627)):
            Rectangle(SKETCH26_W, SKETCH26_H)
    boss_extrude11 = extrude(amount=BOSS_EXTRUDE11_DEPTH)

    # Mirror1: Boss-Extrude11 across plane
    add(boss_extrude11.mirror(Plane(origin=(0, 0, 0), x_dir=(0, 0, 1), z_dir=(1, 0, 0))))

    # Sketch27 → Boss-Extrude12 (add)
    with BuildSketch(Plane(origin=(0, 0, 0), x_dir=(-1, 0, 0), z_dir=(0, 0, -1))):
        Polygon((46.838884711, -70.649060215), (46.838884711, -77.998628627), (88.998884711, -77.998628627), (88.998884711, -95.718628627), (83.998884711, -95.718628627), (83.998884711, -90.718628627), (83.998884711, -82.998628627), (41.838884711, -82.998628627), (41.838884711, -70.649060215), align=None)
        Polygon((-88.998884711, -95.718628627), (-88.998884711, -77.998628627), (-46.838884711, -77.998628627), (-46.838884711, -72), (-41.838884711, -72), (-41.838884711, -82.998628627), (-83.998884711, -82.998628627), (-83.998884711, -90.718628627), (-83.998884711, -95.718628627), align=None)
    extrude(amount=BOSS_EXTRUDE12_DEPTH)


solid = part_1.part
